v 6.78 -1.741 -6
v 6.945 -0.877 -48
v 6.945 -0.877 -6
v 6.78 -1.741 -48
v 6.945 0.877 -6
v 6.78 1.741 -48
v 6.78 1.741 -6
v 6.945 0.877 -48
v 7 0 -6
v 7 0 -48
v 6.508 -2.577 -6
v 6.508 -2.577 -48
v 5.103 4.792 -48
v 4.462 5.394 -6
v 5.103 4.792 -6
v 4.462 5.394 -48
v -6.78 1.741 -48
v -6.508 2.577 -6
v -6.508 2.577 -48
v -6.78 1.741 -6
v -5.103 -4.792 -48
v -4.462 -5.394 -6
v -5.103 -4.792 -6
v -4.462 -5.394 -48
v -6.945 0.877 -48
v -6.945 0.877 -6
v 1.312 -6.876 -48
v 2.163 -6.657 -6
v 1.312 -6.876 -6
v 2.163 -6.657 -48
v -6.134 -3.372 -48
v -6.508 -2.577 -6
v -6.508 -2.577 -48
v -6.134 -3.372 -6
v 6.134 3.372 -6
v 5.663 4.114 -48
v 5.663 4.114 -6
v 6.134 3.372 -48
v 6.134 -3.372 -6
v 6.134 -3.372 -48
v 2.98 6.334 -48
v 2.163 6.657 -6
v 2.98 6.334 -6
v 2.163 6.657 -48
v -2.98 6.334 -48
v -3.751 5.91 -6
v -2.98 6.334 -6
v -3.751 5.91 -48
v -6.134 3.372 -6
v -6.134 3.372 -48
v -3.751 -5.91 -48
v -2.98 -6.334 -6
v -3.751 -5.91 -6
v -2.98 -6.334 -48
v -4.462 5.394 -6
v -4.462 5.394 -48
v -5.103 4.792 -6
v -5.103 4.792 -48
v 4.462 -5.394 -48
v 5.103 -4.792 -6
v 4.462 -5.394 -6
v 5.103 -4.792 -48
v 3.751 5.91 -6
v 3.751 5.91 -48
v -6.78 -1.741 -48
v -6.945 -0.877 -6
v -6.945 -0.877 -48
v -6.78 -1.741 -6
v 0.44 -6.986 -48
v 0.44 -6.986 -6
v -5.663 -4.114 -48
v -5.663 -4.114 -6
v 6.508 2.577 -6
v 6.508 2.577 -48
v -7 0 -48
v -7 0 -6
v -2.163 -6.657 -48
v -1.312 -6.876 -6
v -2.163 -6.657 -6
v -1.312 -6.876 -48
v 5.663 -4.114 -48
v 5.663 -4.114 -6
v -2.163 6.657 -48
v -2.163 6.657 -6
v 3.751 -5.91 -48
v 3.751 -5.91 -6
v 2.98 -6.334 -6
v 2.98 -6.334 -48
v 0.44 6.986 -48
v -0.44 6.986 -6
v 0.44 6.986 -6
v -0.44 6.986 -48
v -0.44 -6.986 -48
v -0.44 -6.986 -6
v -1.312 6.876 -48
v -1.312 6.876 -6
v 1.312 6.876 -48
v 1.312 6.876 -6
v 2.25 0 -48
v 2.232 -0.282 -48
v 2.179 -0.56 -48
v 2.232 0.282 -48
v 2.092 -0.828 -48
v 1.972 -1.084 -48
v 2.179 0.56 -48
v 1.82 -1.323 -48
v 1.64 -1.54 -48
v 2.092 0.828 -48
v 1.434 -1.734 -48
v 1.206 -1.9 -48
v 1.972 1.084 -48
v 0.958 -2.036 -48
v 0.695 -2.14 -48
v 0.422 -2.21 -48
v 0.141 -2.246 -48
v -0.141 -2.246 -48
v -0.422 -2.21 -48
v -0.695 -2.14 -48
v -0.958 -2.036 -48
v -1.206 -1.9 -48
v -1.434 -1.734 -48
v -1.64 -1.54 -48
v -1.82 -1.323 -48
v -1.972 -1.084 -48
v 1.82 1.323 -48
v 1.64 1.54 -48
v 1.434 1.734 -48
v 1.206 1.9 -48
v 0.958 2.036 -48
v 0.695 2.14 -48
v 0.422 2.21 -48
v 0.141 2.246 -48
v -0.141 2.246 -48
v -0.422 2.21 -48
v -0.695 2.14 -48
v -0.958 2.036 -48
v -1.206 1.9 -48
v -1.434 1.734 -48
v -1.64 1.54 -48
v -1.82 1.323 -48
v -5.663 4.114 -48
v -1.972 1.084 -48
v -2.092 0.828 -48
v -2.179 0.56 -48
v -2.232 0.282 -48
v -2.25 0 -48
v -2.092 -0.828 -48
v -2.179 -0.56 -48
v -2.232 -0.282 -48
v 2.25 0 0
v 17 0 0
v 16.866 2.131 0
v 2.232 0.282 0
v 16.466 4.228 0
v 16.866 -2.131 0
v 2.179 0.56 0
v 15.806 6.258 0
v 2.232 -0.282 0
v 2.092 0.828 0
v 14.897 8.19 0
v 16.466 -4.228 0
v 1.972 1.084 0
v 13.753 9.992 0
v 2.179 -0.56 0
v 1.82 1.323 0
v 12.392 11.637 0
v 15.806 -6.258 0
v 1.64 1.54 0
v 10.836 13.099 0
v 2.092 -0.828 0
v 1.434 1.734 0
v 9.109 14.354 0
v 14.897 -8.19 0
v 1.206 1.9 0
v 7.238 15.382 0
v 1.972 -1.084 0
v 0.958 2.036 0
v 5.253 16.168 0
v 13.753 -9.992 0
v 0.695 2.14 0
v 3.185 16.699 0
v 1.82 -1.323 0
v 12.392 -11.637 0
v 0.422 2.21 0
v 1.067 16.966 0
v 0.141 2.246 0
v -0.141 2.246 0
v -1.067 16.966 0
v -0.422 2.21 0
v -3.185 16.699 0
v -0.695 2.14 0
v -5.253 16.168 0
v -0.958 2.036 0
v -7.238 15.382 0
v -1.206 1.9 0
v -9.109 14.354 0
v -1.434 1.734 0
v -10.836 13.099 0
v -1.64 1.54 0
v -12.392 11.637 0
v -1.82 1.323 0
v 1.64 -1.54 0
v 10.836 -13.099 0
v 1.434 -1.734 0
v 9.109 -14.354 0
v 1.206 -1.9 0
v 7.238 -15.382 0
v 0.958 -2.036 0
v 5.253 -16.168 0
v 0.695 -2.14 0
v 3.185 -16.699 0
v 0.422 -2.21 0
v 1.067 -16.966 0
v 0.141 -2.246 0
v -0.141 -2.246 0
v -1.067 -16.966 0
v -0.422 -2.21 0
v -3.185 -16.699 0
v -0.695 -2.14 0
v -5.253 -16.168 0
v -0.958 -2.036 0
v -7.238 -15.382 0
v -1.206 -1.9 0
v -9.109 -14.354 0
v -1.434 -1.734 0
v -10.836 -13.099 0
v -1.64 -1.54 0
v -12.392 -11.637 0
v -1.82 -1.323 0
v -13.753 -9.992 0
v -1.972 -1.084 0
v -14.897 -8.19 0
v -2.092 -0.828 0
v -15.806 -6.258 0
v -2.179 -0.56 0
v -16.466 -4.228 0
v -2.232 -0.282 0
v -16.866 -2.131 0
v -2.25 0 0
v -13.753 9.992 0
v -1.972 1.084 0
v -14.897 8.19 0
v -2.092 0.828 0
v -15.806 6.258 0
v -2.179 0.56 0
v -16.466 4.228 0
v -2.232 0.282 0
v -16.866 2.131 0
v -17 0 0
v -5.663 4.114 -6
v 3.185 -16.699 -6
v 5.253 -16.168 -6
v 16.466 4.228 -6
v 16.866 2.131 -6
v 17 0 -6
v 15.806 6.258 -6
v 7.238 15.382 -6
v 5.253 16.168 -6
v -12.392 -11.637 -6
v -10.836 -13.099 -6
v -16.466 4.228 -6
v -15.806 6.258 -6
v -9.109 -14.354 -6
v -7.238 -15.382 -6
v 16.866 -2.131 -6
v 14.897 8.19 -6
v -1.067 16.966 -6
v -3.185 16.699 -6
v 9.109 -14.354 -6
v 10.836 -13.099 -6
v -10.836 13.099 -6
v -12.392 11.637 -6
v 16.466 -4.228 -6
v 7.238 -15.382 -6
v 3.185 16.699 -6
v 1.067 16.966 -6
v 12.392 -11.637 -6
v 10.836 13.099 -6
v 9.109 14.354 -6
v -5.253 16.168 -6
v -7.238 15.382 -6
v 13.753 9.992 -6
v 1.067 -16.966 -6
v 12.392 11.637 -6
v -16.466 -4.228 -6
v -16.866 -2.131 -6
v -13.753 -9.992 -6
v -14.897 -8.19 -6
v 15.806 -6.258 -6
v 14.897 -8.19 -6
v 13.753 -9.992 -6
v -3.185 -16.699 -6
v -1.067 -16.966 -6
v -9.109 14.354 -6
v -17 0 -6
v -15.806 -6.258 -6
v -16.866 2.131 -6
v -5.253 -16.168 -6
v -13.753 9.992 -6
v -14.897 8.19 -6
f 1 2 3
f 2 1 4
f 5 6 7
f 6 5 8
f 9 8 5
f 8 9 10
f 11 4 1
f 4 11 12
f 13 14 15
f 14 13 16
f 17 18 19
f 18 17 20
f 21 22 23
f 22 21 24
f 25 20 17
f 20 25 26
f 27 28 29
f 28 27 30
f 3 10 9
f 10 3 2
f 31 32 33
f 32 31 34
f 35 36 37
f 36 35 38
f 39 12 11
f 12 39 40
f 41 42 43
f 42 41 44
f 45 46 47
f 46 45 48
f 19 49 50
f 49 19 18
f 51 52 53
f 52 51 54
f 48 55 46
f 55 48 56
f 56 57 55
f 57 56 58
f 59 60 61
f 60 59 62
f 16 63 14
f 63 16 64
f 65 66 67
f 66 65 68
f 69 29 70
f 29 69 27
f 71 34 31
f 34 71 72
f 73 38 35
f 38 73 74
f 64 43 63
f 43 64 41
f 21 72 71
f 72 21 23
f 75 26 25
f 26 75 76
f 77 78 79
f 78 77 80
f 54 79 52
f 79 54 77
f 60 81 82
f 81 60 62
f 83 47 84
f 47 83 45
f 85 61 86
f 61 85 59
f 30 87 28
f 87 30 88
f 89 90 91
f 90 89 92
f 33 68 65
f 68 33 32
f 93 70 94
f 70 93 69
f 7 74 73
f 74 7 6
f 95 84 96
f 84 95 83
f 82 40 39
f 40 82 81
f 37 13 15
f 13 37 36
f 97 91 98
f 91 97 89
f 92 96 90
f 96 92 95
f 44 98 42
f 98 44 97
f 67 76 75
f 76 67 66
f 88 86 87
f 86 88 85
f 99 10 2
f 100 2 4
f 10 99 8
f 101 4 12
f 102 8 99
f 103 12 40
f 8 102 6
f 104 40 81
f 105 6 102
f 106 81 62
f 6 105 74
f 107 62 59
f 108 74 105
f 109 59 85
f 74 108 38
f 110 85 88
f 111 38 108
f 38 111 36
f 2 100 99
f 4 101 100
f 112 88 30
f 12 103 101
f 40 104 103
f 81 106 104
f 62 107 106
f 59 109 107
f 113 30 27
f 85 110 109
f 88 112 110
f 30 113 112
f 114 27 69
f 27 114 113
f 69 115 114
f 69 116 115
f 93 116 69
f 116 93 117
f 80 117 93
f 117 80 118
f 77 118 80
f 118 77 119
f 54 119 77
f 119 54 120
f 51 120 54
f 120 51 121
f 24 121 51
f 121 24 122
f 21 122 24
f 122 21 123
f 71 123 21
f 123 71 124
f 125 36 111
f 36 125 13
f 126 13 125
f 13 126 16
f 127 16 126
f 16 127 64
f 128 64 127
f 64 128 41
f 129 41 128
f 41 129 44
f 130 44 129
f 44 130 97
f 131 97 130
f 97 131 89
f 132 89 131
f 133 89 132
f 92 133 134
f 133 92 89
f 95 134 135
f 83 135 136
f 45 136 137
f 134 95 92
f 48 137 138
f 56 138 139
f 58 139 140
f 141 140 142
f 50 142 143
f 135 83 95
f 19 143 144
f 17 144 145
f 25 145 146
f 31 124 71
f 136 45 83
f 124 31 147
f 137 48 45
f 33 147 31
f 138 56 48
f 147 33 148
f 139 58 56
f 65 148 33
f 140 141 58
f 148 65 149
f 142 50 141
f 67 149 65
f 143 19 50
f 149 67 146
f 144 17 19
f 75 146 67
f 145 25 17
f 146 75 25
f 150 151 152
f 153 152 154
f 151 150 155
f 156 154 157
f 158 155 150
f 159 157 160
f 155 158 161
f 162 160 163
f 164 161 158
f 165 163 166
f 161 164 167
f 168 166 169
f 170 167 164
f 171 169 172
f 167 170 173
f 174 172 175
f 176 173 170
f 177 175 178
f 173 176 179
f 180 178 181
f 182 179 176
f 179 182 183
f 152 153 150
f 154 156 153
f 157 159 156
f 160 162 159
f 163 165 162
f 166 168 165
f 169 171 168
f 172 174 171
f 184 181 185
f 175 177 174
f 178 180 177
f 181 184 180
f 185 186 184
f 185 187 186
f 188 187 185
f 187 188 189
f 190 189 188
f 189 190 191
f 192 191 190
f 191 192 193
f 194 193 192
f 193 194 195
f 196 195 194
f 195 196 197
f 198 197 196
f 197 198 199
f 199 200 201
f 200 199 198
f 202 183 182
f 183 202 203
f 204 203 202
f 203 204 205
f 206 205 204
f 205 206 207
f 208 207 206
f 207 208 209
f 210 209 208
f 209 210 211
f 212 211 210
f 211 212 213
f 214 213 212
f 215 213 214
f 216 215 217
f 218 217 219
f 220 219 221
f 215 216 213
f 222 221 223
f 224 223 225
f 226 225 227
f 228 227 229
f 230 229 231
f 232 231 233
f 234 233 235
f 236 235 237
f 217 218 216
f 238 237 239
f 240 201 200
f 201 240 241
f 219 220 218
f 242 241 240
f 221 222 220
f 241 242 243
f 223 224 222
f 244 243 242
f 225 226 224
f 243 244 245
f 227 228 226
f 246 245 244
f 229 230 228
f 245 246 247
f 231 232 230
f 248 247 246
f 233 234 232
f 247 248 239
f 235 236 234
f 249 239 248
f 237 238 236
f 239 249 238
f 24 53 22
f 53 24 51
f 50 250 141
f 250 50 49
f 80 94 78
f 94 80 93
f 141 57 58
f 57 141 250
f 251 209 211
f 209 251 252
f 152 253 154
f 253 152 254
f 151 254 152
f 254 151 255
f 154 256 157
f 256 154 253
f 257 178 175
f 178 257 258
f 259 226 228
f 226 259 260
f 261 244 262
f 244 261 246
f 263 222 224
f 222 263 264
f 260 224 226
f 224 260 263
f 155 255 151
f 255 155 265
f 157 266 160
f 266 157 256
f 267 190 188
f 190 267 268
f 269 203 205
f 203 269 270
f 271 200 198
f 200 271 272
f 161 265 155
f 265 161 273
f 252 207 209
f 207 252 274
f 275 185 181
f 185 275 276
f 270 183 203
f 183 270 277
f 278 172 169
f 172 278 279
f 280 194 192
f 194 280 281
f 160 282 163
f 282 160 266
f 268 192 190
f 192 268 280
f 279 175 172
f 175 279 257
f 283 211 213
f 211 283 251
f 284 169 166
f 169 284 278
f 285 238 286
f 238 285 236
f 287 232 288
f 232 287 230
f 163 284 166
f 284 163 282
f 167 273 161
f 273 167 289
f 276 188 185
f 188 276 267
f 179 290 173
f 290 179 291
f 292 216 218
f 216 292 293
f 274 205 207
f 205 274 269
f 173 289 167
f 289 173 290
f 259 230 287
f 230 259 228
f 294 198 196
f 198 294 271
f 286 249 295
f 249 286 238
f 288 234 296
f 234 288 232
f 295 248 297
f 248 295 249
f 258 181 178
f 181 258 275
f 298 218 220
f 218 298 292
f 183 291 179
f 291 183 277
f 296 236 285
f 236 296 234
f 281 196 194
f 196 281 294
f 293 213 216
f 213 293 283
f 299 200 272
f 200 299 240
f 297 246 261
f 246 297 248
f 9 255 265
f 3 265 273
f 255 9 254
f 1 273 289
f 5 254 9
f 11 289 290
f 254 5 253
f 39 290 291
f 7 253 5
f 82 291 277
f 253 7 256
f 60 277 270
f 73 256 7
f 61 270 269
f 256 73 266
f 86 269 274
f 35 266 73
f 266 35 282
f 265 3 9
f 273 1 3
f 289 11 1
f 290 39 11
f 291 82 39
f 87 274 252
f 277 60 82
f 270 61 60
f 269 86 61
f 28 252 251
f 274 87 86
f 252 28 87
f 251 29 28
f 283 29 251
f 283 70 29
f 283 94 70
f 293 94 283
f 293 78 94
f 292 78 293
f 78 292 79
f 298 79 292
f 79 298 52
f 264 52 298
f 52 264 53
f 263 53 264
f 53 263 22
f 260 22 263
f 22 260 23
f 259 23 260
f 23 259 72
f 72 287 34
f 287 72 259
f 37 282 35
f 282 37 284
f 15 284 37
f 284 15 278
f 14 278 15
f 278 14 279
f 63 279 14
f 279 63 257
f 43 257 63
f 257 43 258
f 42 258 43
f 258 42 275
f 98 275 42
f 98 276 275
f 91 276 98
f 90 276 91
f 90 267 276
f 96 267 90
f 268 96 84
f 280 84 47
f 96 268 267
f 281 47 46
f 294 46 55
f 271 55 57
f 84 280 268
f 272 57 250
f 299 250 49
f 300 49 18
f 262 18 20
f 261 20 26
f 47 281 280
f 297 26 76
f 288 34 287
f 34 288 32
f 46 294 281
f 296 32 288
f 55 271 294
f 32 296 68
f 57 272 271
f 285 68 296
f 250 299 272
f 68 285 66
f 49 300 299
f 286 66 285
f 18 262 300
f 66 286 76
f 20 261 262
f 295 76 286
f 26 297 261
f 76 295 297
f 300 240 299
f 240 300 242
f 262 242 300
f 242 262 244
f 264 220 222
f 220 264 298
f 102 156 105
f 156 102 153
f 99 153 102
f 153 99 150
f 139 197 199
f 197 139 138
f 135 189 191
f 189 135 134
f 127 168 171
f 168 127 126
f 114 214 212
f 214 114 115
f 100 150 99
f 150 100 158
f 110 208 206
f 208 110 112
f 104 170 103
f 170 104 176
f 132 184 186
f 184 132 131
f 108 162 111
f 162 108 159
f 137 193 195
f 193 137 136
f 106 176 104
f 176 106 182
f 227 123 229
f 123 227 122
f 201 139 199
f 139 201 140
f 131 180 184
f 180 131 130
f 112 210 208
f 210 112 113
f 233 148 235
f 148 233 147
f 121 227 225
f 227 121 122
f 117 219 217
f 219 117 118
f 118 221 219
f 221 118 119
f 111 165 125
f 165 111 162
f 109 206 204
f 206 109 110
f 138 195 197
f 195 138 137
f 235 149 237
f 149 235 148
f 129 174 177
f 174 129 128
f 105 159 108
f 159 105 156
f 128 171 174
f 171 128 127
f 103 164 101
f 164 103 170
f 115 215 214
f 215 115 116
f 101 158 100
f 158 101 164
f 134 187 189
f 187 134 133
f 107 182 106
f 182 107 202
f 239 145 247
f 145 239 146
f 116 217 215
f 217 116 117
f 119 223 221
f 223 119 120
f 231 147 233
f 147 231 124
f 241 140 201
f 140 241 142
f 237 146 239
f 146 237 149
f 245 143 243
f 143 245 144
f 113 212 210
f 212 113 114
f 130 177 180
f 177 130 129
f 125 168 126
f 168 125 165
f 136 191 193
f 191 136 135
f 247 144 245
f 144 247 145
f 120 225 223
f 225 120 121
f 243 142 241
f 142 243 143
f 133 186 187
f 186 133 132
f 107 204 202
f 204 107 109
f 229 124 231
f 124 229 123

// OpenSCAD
$fn = 50;


difference() {
	union() {
		translate(v = [0, 0, -48.0000000000]) {
			cylinder(h = 48, r = 7.0000000000);
		}
		translate(v = [0, 0, -6.0000000000]) {
			cylinder(h = 6, r = 17.0000000000);
		}
	}
	union() {
		#translate(v = [0, 0, -48]) {
			cylinder(h = 48, r = 2.2500000000);
		}
	}
}
